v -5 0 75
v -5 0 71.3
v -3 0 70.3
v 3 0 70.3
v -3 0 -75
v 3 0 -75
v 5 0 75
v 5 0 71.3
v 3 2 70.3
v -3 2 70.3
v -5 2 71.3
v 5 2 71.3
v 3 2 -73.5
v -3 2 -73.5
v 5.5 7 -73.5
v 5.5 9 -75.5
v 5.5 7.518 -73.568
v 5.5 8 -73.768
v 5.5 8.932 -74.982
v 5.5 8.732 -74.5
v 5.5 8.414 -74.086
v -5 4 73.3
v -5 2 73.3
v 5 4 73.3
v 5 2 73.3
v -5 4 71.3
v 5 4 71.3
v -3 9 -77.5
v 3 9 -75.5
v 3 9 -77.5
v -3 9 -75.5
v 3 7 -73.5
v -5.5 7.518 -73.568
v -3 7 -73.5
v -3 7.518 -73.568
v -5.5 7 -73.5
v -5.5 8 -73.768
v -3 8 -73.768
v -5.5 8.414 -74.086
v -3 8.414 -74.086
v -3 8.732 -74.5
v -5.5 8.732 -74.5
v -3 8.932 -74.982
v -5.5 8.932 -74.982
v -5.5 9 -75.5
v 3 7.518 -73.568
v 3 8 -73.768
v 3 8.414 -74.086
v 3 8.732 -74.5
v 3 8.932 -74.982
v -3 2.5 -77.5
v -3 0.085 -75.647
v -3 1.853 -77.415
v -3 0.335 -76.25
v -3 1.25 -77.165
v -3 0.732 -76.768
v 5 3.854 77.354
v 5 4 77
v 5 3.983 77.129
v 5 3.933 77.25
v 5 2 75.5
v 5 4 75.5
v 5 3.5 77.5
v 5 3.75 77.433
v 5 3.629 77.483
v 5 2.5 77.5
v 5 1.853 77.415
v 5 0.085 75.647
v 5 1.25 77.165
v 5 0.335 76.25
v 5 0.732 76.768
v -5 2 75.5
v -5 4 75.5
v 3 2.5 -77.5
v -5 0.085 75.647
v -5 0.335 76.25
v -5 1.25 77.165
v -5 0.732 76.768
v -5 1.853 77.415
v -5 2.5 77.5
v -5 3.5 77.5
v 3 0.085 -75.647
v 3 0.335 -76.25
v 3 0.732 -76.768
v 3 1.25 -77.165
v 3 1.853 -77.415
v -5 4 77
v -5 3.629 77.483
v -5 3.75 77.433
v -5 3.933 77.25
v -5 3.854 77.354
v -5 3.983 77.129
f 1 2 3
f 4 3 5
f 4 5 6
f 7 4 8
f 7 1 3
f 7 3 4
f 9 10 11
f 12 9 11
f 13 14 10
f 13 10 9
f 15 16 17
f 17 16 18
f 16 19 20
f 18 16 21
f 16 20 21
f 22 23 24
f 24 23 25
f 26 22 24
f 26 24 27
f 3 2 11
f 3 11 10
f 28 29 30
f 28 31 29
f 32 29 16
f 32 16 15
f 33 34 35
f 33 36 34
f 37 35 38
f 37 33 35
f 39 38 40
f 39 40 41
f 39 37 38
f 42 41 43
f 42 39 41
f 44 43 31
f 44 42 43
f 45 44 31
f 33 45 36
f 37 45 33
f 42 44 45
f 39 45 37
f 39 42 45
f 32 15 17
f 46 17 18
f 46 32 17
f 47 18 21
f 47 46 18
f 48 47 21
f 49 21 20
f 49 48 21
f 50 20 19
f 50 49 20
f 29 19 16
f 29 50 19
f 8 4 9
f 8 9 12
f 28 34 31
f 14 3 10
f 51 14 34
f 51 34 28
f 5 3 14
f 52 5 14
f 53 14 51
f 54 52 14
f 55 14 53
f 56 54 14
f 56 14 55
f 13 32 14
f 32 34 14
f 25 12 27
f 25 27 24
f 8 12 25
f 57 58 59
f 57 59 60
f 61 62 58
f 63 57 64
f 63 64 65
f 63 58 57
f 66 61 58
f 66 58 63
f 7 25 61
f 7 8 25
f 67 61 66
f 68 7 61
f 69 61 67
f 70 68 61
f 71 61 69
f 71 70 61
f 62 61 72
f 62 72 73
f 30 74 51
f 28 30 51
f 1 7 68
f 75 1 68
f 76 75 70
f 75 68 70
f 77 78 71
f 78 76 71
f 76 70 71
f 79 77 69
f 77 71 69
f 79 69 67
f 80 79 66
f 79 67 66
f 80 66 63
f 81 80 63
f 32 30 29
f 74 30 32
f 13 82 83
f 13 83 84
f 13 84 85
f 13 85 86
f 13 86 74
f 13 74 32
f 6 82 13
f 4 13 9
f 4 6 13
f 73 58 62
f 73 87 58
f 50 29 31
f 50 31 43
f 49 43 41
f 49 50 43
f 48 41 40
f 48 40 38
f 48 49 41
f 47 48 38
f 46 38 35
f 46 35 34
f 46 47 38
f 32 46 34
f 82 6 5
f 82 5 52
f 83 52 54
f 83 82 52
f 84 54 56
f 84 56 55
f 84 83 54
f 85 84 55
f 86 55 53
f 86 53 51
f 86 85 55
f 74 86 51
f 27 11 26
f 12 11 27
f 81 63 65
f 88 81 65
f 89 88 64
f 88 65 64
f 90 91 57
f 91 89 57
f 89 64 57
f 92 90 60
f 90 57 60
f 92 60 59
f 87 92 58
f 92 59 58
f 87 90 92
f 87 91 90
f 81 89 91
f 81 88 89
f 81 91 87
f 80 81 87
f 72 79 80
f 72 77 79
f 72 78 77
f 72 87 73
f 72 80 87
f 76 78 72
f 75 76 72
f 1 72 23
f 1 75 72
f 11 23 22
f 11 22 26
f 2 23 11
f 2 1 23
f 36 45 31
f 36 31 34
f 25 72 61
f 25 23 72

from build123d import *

# Parameters (mm, degrees)
SKETCH1_W                       = 39
SKETCH1_H                       = 155
BOSS_EXTRUDE1_DEPTH             = 2
BOSS_EXTRUDE2_DEPTH             = 38
SKETCH3_W                       = 2
SKETCH3_H                       = 2
BOSS_EXTRUDE3_DEPTH             = 38
SKETCH4_W                       = 2
SKETCH4_H                       = 2
BOSS_EXTRUDE4_DEPTH             = 151
SKETCH6_W                       = 35
SKETCH6_H                       = 2.2
CUT_EXTRUDE1_DEPTH              = 160.340045186
SKETCH7_W                       = 35
SKETCH7_H                       = 2.2
CUT_EXTRUDE2_DEPTH              = 89.490112442
SKETCH5_W                       = 31
SKETCH5_H                       = 2
BOSS_EXTRUDE5_DEPTH             = 2
BOSS_EXTRUDE6_REACH             = 91.367
SKETCH8_W                       = 2
SKETCH8_H                       = 2
BOSS_EXTRUDE6_DIRECTION_2_REACH = 91.367
SKETCH10_W                      = 2
SKETCH10_H                      = 2.2
SKETCH10_W_2                    = 2.2
SKETCH10_H_2                    = 2
BOSS_EXTRUDE8_DEPTH             = 2
SKETCH11_W                      = 2
SKETCH11_H                      = 2.2
SKETCH11_W_2                    = 2.2
SKETCH11_H_2                    = 2
BOSS_EXTRUDE9_DEPTH             = 2
FILLET2_R                       = 2.5
SKETCH14_W                      = 36.5
SKETCH14_H                      = 7.75
BOSS_EXTRUDE10_DEPTH            = 2
SKETCH13_W                      = 31
SKETCH13_H                      = 3
CUT_EXTRUDE4_DEPTH              = 2
FILLET3_R                       = 2
FILLET4_R                       = 0.5
SKETCH15_R                      = 5.1
CUT_EXTRUDE5_DEPTH              = 90.367219941
SKETCH16_R                      = 7.1
BOSS_EXTRUDE11_DEPTH            = 1
FILLET5_R                       = 0.5
CUT_EXTRUDE3_DEPTH              = 160.340045186
FILLET6_R                       = 0.4
FILLET7_R                       = 0.5
CUT_EXTRUDE8_DEPTH              = 90.367220028
CUT_EXTRUDE8_DEPTH_BACK         = 90.367220028
CUT_EXTRUDE11_DEPTH             = 81.420768473
CUT_EXTRUDE12_DEPTH             = 80.851424566
CUT_EXTRUDE13_DEPTH             = 2.5
SKETCH27_R                      = 5.1
BOSS_EXTRUDE12_DEPTH            = 2
CUT_EXTRUDE14_DEPTH             = 80.851424533
CUT_EXTRUDE14_DEPTH_BACK        = 80.851424533
SKETCH29_W                      = 92.7
SKETCH29_H                      = 1
SKETCH30_W                      = 2.5
SKETCH30_H                      = 155
CUT_EXTRUDE15_DEPTH             = 80.851424533
BOSS_EXTRUDE13_START            = -14.5
SKETCH31_W                      = 2
SKETCH31_H                      = 5.25
BOSS_EXTRUDE13_DEPTH            = 29
CUT_EXTRUDE16_DEPTH             = 80.35678925
BOSS_EXTRUDE14_DEPTH            = 5.5
BOSS_EXTRUDE14_DEPTH_BACK       = 5.5


with BuildPart() as part:
    # Sketch1 → Boss-Extrude1 (new body)
    with BuildSketch(Plane(origin=(0, 0, 0), x_dir=(1, 0, 0), z_dir=(0, 1, 0))):
        Rectangle(SKETCH1_W, SKETCH1_H)
    extrude(amount=BOSS_EXTRUDE1_DEPTH)

    # Sketch2 → Boss-Extrude2 (add)
    with BuildSketch(Plane(origin=(0, 2, 0), x_dir=(1, 0, 0), z_dir=(0, 1, 0))):
        Polygon((-17.5, -77.5), (-17.5, -75.5), (-17.5, 75.5), (17.5, 75.5), (17.5, -75.5), (17.5, -77.5), (19.5, -77.5), (19.5, 77.5), (-19.5, 77.5), (-19.5, -77.5), align=None)
    extrude(amount=BOSS_EXTRUDE2_DEPTH)

    # Sketch3 → Boss-Extrude3 (add)
    with BuildSketch(Plane(origin=(0, 2, 0), x_dir=(1, 0, 0), z_dir=(0, 1, 0))):
        with Locations((-16.5, -76.5)):
            Rectangle(SKETCH3_W, SKETCH3_H)
        with Locations((-16.5, -72.3)):
            Rectangle(SKETCH3_W, SKETCH3_H)
        with Locations((16.5, -76.5)):
            Rectangle(SKETCH3_W, SKETCH3_H)
        with Locations((16.5, -72.3)):
            Rectangle(SKETCH3_W, SKETCH3_H)
    extrude(amount=BOSS_EXTRUDE3_DEPTH)

    # Sketch4 → Boss-Extrude4 (add)
    with BuildSketch(Plane.XY.offset(-75.5)):
        with Locations((-16.5, 39)):
            Rectangle(SKETCH4_W, SKETCH4_H)
        Polygon((-15.5, 33.8), (-17.5, 31.8), (-17.5, 35.8), (-15.5, 35.8), align=None)
        Polygon((15.5, 35.8), (17.5, 35.8), (17.5, 31.8), (15.5, 33.8), align=None)
        with Locations((16.5, 39)):
            Rectangle(SKETCH4_W, SKETCH4_H)
    extrude(amount=BOSS_EXTRUDE4_DEPTH)

    # Sketch6 → Cut-Extrude1 (cut, through all)
    with BuildSketch(Plane.XY.offset(-75.5)):
        with Locations((0, 36.9)):
            Rectangle(SKETCH6_W, SKETCH6_H)
    extrude(amount=CUT_EXTRUDE1_DEPTH, mode=Mode.SUBTRACT)

    # Sketch7 → Cut-Extrude2 (cut, through all)
    with BuildSketch(Plane(origin=(0, 2, 0), x_dir=(1, 0, 0), z_dir=(0, 1, 0))):
        with Locations((0, -74.4)):
            Rectangle(SKETCH7_W, SKETCH7_H)
    extrude(amount=CUT_EXTRUDE2_DEPTH, mode=Mode.SUBTRACT)

    # Sketch5 → Boss-Extrude5 (add)
    with BuildSketch(Plane(origin=(0, 2, 0), x_dir=(1, 0, 0), z_dir=(0, 1, 0))):
        with Locations((0, -76.5)):
            Rectangle(SKETCH5_W, SKETCH5_H)
        with Locations((0, -72.3)):
            Rectangle(SKETCH5_W, SKETCH5_H)
    extrude(amount=BOSS_EXTRUDE5_DEPTH)

    # Boss-Extrude6: up to this face of the body (flat: up to its plane)
    boss_extrude6_end = Plane(part.part.faces().sort_by_distance((17.5, 16.9, -2.1))[0])
    # Sketch8 → Boss-Extrude6 (add, up to the picked face)
    with BuildSketch(Plane(origin=(0, 0, 0), x_dir=(0, 0, -1), z_dir=(1, 0, 0)), mode=Mode.PRIVATE) as boss_extrude6_sk1:
        with Locations((74.5, 39)):
            Rectangle(SKETCH8_W, SKETCH8_H)
    boss_extrude6_tool1 = split(extrude(boss_extrude6_sk1.sketch, amount=BOSS_EXTRUDE6_REACH, mode=Mode.PRIVATE), bisect_by=boss_extrude6_end, keep=Keep.BOTH, mode=Mode.PRIVATE)
    # Sketch8 → Boss-Extrude6 (add, up to the picked face)
    with BuildSketch(Plane(origin=(0, 0, 0), x_dir=(0, 0, -1), z_dir=(1, 0, 0)), mode=Mode.PRIVATE) as boss_extrude6_sk2:
        Polygon((75.5, 35.8), (73.5, 35.8), (73.5, 33.8), (75.5, 31.8), align=None)
    boss_extrude6_tool2 = split(extrude(boss_extrude6_sk2.sketch, amount=BOSS_EXTRUDE6_REACH, mode=Mode.PRIVATE), bisect_by=boss_extrude6_end, keep=Keep.BOTH, mode=Mode.PRIVATE)
    add(boss_extrude6_tool1.solids().sort_by(Axis((0, 39, -74.5), (1, 0, 0)))[0])
    add(boss_extrude6_tool2.solids().sort_by(Axis((0, 34.244444, -74.611111), (1, 0, 0)))[0])

    # Boss-Extrude6 direction 2: up to this face of the body (flat: up to its plane)
    boss_extrude6_direction_2_end = Plane(part.part.faces().sort_by_distance((-17.5, 16.9, -2.1))[0])
    # Sketch8 → Boss-Extrude6 direction 2 (add, up to the picked face)
    with BuildSketch(Plane(origin=(0, 0, 0), x_dir=(0, 0, -1), z_dir=(1, 0, 0)), mode=Mode.PRIVATE) as boss_extrude6_direction_2_sk1:
        with Locations((74.5, 39)):
            Rectangle(SKETCH8_W, SKETCH8_H)
    boss_extrude6_direction_2_tool1 = split(extrude(boss_extrude6_direction_2_sk1.sketch, amount=-BOSS_EXTRUDE6_DIRECTION_2_REACH, mode=Mode.PRIVATE), bisect_by=boss_extrude6_direction_2_end, keep=Keep.BOTH, mode=Mode.PRIVATE)
    # Sketch8 → Boss-Extrude6 direction 2 (add, up to the picked face)
    with BuildSketch(Plane(origin=(0, 0, 0), x_dir=(0, 0, -1), z_dir=(1, 0, 0)), mode=Mode.PRIVATE) as boss_extrude6_direction_2_sk2:
        Polygon((75.5, 35.8), (73.5, 35.8), (73.5, 33.8), (75.5, 31.8), align=None)
    boss_extrude6_direction_2_tool2 = split(extrude(boss_extrude6_direction_2_sk2.sketch, amount=-BOSS_EXTRUDE6_DIRECTION_2_REACH, mode=Mode.PRIVATE), bisect_by=boss_extrude6_direction_2_end, keep=Keep.BOTH, mode=Mode.PRIVATE)
    add(boss_extrude6_direction_2_tool1.solids().sort_by(Axis((0, 39, -74.5), (-1, 0, 0)))[0])
    add(boss_extrude6_direction_2_tool2.solids().sort_by(Axis((0, 34.244444, -74.611111), (-1, 0, 0)))[0])

    # Sketch10 → Boss-Extrude8 (add)
    with BuildSketch(Plane(origin=(-17.5, 0, 0), x_dir=(0, 0, -1), z_dir=(1, 0, 0))):
        with Locations((-76.5, 36.9)):
            Rectangle(SKETCH10_W, SKETCH10_H)
        with Locations((-74.4, 39)):
            Rectangle(SKETCH10_W_2, SKETCH10_H_2)
    extrude(amount=BOSS_EXTRUDE8_DEPTH)

    # Sketch11 → Boss-Extrude9 (add)
    with BuildSketch(Plane.ZY.offset(-17.5)):
        with Locations((76.5, 36.9)):
            Rectangle(SKETCH11_W, SKETCH11_H)
        with Locations((74.4, 39)):
            Rectangle(SKETCH11_W_2, SKETCH11_H_2)
    extrude(amount=BOSS_EXTRUDE9_DEPTH)

    # Fillet2
    fillet2_edges = [part.edges().sort_by_distance(p)[0] for p in [
        (-17.5, 16.9, 71.3),
        (17.5, 16.9, 71.3),
        (19.5, 20, 77.5),
        (-19.5, 20, 77.5),
        (-19.5, 20, -77.5),
        (-17.5, 16.9, -75.5),
        (17.5, 16.9, -75.5),
        (19.5, 20, -77.5),
        (19.5, 40, 0),
        (-19.5, 40, 0),
        (19.5, 0, 0),
        (-19.5, 0, 0),
        (0, 40, -77.5),
        (0, 0, 77.5),
        (0, 0, -77.5),
        (-17.5, 40, 77.5),
        (17.5, 40, 77.5),
    ]]
    fillet(fillet2_edges, radius=FILLET2_R)

    # Sketch14 → Boss-Extrude10 (add)
    with BuildSketch(Plane.XY.offset(-75.5)):
        with Locations((0, 5.125)):
            Rectangle(SKETCH14_W, SKETCH14_H)
    extrude(amount=BOSS_EXTRUDE10_DEPTH)

    # Sketch13 → Cut-Extrude4 (cut)
    with BuildSketch(Plane(origin=(0, 0, -77.5), x_dir=(-1, 0, 0), z_dir=(0, 0, -1))):
        with Locations((0, 5.5)):
            Rectangle(SKETCH13_W, SKETCH13_H)
    extrude(amount=-CUT_EXTRUDE4_DEPTH, mode=Mode.SUBTRACT)

    # Fillet3
    fillet3_edges = [part.edges().sort_by_distance(p)[0] for p in [
        (0, 9, -73.5),
    ]]
    fillet(fillet3_edges, radius=FILLET3_R - 0.0001)  # a hair under: the kernel refuses the full size

    # Fillet4
    fillet4_edges = [part.edges().sort_by_distance(p)[0] for p in [
        (15.5, 5.5, -75.5),
        (15.5, 4, -76.5),
        (0, 7, -75.5),
        (15.5, 7, -76.5),
        (-15.5, 5.5, -75.5),
        (-15.5, 7, -76.5),
        (0, 4, -75.5),
        (-15.5, 4, -76.5),
        (15.5, 5.5, -77.5),
        (0, 4, -77.5),
        (-15.5, 5.5, -77.5),
        (0, 7, -77.5),
    ]]
    fillet(fillet4_edges, radius=FILLET4_R)

    # Sketch15 → Cut-Extrude5 (cut, through all)
    with BuildSketch(Plane.XZ):
        with Locations(Location((0, 38.75, 0), (0, 0, 270))):
            Circle(SKETCH15_R)
        with Locations(Location((0, -38.75, 0), (0, 0, 270))):
            Circle(SKETCH15_R)
    extrude(amount=-CUT_EXTRUDE5_DEPTH, mode=Mode.SUBTRACT)

    # Sketch16 → Boss-Extrude11 (add)
    with BuildSketch(Plane(origin=(0, 2, 0), x_dir=(1, 0, 0), z_dir=(0, 1, 0))):
        with Locations(Location((0, 38.75, 0), (0, 0, 270))):
            Circle(SKETCH16_R)
        with Locations(Location((0, -38.75, 0), (0, 0, 270))):
            Circle(SKETCH16_R)
    extrude(amount=BOSS_EXTRUDE11_DEPTH)

    # Fillet5
    fillet5_edges = [part.edges().sort_by_distance(p)[0] for p in [
        (0, 2, -45.85),
        (0, 3, -45.85),
        (0, 2, 31.65),
        (0, 3, 31.65),
    ]]
    fillet(fillet5_edges, radius=FILLET5_R - 0.0001)  # a hair under: the kernel refuses the full size

    # Sketch12 → Cut-Extrude3 (cut, through all)
    with BuildSketch(Plane.XY.offset(-75.5)):
        with BuildLine():
            Line((1.668907005, 12.688040659), (2.22520934, 10.250720878))
            ThreePointArc((2.22520934, 10.250720878), (4.338837391, 10.990311321), (6.234898019, 12.181685175))
            Line((6.234898019, 12.181685175), (4.676173514, 14.136263881))
            ThreePointArc((4.676173514, 14.136263881), (3.254128043, 13.242733491), (1.668907005, 12.688040659))
        make_face()
        with BuildLine():
            ThreePointArc((-6.234898019, 12.181685175), (-4.338837391, 10.990311321), (-2.22520934, 10.250720878))
            Line((-2.22520934, 10.250720878), (-1.668907005, 12.688040659))
            ThreePointArc((-1.668907005, 12.688040659), (-3.254128043, 13.242733491), (-4.676173514, 14.136263881))
            Line((-4.676173514, 14.136263881), (-6.234898019, 12.181685175))
        make_face()
        with BuildLine():
            ThreePointArc((-10, 20), (-9.749279122, 17.77479066), (-9.009688679, 15.661162609))
            Line((-9.009688679, 15.661162609), (-6.757266509, 16.745871957))
            ThreePointArc((-6.757266509, 16.745871957), (-7.311959341, 18.331092995), (-7.5, 20))
            Line((-7.5, 20), (-10, 20))
        make_face()
        with BuildLine():
            ThreePointArc((-6.234898019, 27.818314825), (-7.818314825, 26.234898019), (-9.009688679, 24.338837391))
            Line((-9.009688679, 24.338837391), (-6.757266509, 23.254128043))
            ThreePointArc((-6.757266509, 23.254128043), (-5.863736119, 24.676173514), (-4.676173514, 25.863736119))
            Line((-4.676173514, 25.863736119), (-6.234898019, 27.818314825))
        make_face()
        with BuildLine():
            ThreePointArc((-1.668907005, 27.311959341), (-0.839733571, 27.452841574), (0, 27.5))
            Line((0, 27.5), (0, 30))
            ThreePointArc((0, 30), (-1.119644761, 29.937122099), (-2.22520934, 29.749279122))
            Line((-2.22520934, 29.749279122), (-1.668907005, 27.311959341))
        make_face()
        with BuildLine():
            Line((0, 30), (0, 27.5))
            ThreePointArc((0, 27.5), (0.839733571, 27.452841574), (1.668907005, 27.311959341))
            Line((1.668907005, 27.311959341), (2.22520934, 29.749279122))
            ThreePointArc((2.22520934, 29.749279122), (1.119644761, 29.937122099), (0, 30))
        make_face()
        with BuildLine():
            Line((6.757266509, 23.254128043), (9.009688679, 24.338837391))
            ThreePointArc((9.009688679, 24.338837391), (7.818314825, 26.234898019), (6.234898019, 27.818314825))
            Line((6.234898019, 27.818314825), (4.676173514, 25.863736119))
            ThreePointArc((4.676173514, 25.863736119), (5.863736119, 24.676173514), (6.757266509, 23.254128043))
        make_face()
        with BuildLine():
            Line((6.757266509, 16.745871957), (9.009688679, 15.661162609))
            ThreePointArc((9.009688679, 15.661162609), (9.749279122, 17.77479066), (10, 20))
            Line((10, 20), (7.5, 20))
            ThreePointArc((7.5, 20), (7.311959341, 18.331092995), (6.757266509, 16.745871957))
        make_face()
        with BuildLine():
            ThreePointArc((2.5, 20), (2.43731978, 19.443697665), (2.25242217, 18.915290652))
            Line((2.25242217, 18.915290652), (4.50484434, 17.830581304))
            ThreePointArc((4.50484434, 17.830581304), (4.874639561, 18.88739533), (5, 20))
            Line((5, 20), (2.5, 20))
        make_face()
        with BuildLine():
            ThreePointArc((1.558724505, 21.954578706), (1.954578706, 21.558724505), (2.25242217, 21.084709348))
            Line((2.25242217, 21.084709348), (4.50484434, 22.169418696))
            ThreePointArc((4.50484434, 22.169418696), (3.909157412, 23.117449009), (3.117449009, 23.909157412))
            Line((3.117449009, 23.909157412), (1.558724505, 21.954578706))
        make_face()
        with BuildLine():
            Line((0, 25), (0, 22.5))
            ThreePointArc((0, 22.5), (0.27991119, 22.484280525), (0.556302335, 22.43731978))
            Line((0.556302335, 22.43731978), (1.11260467, 24.874639561))
            ThreePointArc((1.11260467, 24.874639561), (0.559822381, 24.968561049), (0, 25))
        make_face()
        with BuildLine():
            ThreePointArc((-0.556302335, 22.43731978), (-0.27991119, 22.484280525), (0, 22.5))
            Line((0, 22.5), (0, 25))
            ThreePointArc((0, 25), (-0.559822381, 24.968561049), (-1.11260467, 24.874639561))
            Line((-1.11260467, 24.874639561), (-0.556302335, 22.43731978))
        make_face()
        with BuildLine():
            ThreePointArc((-2.25242217, 21.084709348), (-1.954578706, 21.558724505), (-1.558724505, 21.954578706))
            Line((-1.558724505, 21.954578706), (-3.117449009, 23.909157412))
            ThreePointArc((-3.117449009, 23.909157412), (-3.909157412, 23.117449009), (-4.50484434, 22.169418696))
            Line((-4.50484434, 22.169418696), (-2.25242217, 21.084709348))
        make_face()
        with BuildLine():
            ThreePointArc((-2.25242217, 18.915290652), (-2.43731978, 19.443697665), (-2.5, 20))
            Line((-2.5, 20), (-5, 20))
            ThreePointArc((-5, 20), (-4.874639561, 18.88739533), (-4.50484434, 17.830581304))
            Line((-4.50484434, 17.830581304), (-2.25242217, 18.915290652))
        make_face()
        with BuildLine():
            ThreePointArc((-3.117449009, 16.090842588), (-2.169418696, 15.49515566), (-1.11260467, 15.125360439))
            Line((-1.11260467, 15.125360439), (-0.556302335, 17.56268022))
            ThreePointArc((-0.556302335, 17.56268022), (-1.084709348, 17.74757783), (-1.558724505, 18.045421294))
            Line((-1.558724505, 18.045421294), (-3.117449009, 16.090842588))
        make_face()
        with BuildLine():
            Line((0.556302335, 17.56268022), (1.11260467, 15.125360439))
            ThreePointArc((1.11260467, 15.125360439), (2.169418696, 15.49515566), (3.117449009, 16.090842588))
            Line((3.117449009, 16.090842588), (1.558724505, 18.045421294))
            ThreePointArc((1.558724505, 18.045421294), (1.084709348, 17.74757783), (0.556302335, 17.56268022))
        make_face()
    extrude(amount=-CUT_EXTRUDE3_DEPTH, mode=Mode.SUBTRACT)

    # Fillet6
    fillet6_edges = [part.edges().sort_by_distance(p)[0] for p in [
        (5.863736119, 24.676173514, -75.5),
        (5.455535766, 26.841025472, -75.5),
        (7.818314825, 26.234898019, -77.5),
        (7.883477594, 23.796482717, -77.5),
        (5.863736119, 24.676173514, -77.5),
        (5.455535766, 26.841025472, -77.5),
        (7.883477594, 23.796482717, -75.5),
        (7.818314825, 26.234898019, -75.5),
        (7.311959341, 18.331092995, -75.5),
        (8.75, 20, -75.5),
        (9.749279122, 17.77479066, -77.5),
        (7.883477594, 16.203517283, -77.5),
        (7.311959341, 18.331092995, -77.5),
        (8.75, 20, -77.5),
        (7.883477594, 16.203517283, -75.5),
        (9.749279122, 17.77479066, -75.5),
        (2.43731978, 19.443697665, -75.5),
        (3.75, 20, -75.5),
        (4.874639561, 18.88739533, -77.5),
        (3.378633255, 18.372935978, -77.5),
        (2.43731978, 19.443697665, -77.5),
        (3.75, 20, -77.5),
        (3.378633255, 18.372935978, -75.5),
        (4.874639561, 18.88739533, -75.5),
        (1.954578706, 21.558724505, -75.5),
        (2.338086757, 22.931868059, -75.5),
        (3.909157412, 23.117449009, -77.5),
        (3.378633255, 21.627064022, -77.5),
        (1.954578706, 21.558724505, -77.5),
        (2.338086757, 22.931868059, -77.5),
        (3.378633255, 21.627064022, -75.5),
        (3.909157412, 23.117449009, -75.5),
        (0, 27.5, -75.5),
        (-1.947058172, 28.530619232, -75.5),
        (0, 30, -77.5),
        (1.947058172, 28.530619232, -77.5),
        (0, 27.5, -77.5),
        (-1.947058172, 28.530619232, -77.5),
        (1.947058172, 28.530619232, -75.5),
        (0, 30, -75.5),
        (-5.863736119, 24.676173514, -75.5),
        (-7.883477594, 23.796482717, -75.5),
        (-7.818314825, 26.234898019, -77.5),
        (-5.455535766, 26.841025472, -77.5),
        (-5.863736119, 24.676173514, -77.5),
        (-7.883477594, 23.796482717, -77.5),
        (-5.455535766, 26.841025472, -75.5),
        (-7.818314825, 26.234898019, -75.5),
        (-7.311959341, 18.331092995, -75.5),
        (-7.883477594, 16.203517283, -75.5),
        (-9.749279122, 17.77479066, -77.5),
        (-8.75, 20, -77.5),
        (-7.311959341, 18.331092995, -77.5),
        (-7.883477594, 16.203517283, -77.5),
        (-8.75, 20, -75.5),
        (-9.749279122, 17.77479066, -75.5),
        (-3.254128043, 13.242733491, -75.5),
        (-1.947058172, 11.469380768, -75.5),
        (-4.338837391, 10.990311321, -77.5),
        (-5.455535766, 13.158974528, -77.5),
        (-3.254128043, 13.242733491, -77.5),
        (-1.947058172, 11.469380768, -77.5),
        (-5.455535766, 13.158974528, -75.5),
        (-4.338837391, 10.990311321, -75.5),
        (1.084709348, 17.74757783, -75.5),
        (2.338086757, 17.068131941, -75.5),
        (2.169418696, 15.49515566, -77.5),
        (0.834453502, 16.344020329, -77.5),
        (1.084709348, 17.74757783, -77.5),
        (2.338086757, 17.068131941, -77.5),
        (0.834453502, 16.344020329, -75.5),
        (2.169418696, 15.49515566, -75.5),
        (-2.43731978, 19.443697665, -75.5),
        (-3.378633255, 18.372935978, -75.5),
        (-4.874639561, 18.88739533, -77.5),
        (-3.75, 20, -77.5),
        (-2.43731978, 19.443697665, -77.5),
        (-3.378633255, 18.372935978, -77.5),
        (-3.75, 20, -75.5),
        (-4.874639561, 18.88739533, -75.5),
        (-1.084709348, 17.74757783, -75.5),
        (-0.834453502, 16.344020329, -75.5),
        (-2.169418696, 15.49515566, -77.5),
        (-2.338086757, 17.068131941, -77.5),
        (-1.084709348, 17.74757783, -77.5),
        (-0.834453502, 16.344020329, -77.5),
        (-2.338086757, 17.068131941, -75.5),
        (-2.169418696, 15.49515566, -75.5),
        (-1.954578706, 21.558724505, -75.5),
        (-3.378633255, 21.627064022, -75.5),
        (-3.909157412, 23.117449009, -77.5),
        (-2.338086757, 22.931868059, -77.5),
        (-1.954578706, 21.558724505, -77.5),
        (-3.378633255, 21.627064022, -77.5),
        (-2.338086757, 22.931868059, -75.5),
        (-3.909157412, 23.117449009, -75.5),
        (0, 25, -77.5),
        (0.834453502, 23.655979671, -77.5),
        (0, 22.5, -75.5),
        (-0.834453502, 23.655979671, -75.5),
        (0, 22.5, -77.5),
        (-0.834453502, 23.655979671, -77.5),
        (0, 25, -75.5),
        (0.834453502, 23.655979671, -75.5),
        (3.254128043, 13.242733491, -75.5),
        (5.455535766, 13.158974528, -75.5),
        (4.338837391, 10.990311321, -77.5),
        (1.947058172, 11.469380768, -77.5),
        (3.254128043, 13.242733491, -77.5),
        (5.455535766, 13.158974528, -77.5),
        (1.947058172, 11.469380768, -75.5),
        (4.338837391, 10.990311321, -75.5),
    ]]
    fillet(fillet6_edges, radius=FILLET6_R)

    # Fillet7
    fillet7_edges = [part.edges().sort_by_distance(p)[0] for p in [
        (15.5, 40, 0.75),
        (0, 4, 77.5),
        (0, 40, -73.5),
        (-15.5, 40, 0.75),
        (-15.5, 20.75, 77.5),
        (-15.5, 39.267766953, 76.767766953),
        (15.5, 20.75, 77.5),
        (15.5, 39.267766953, 76.767766953),
    ]]
    fillet(fillet7_edges, radius=FILLET7_R)

    # Sketch20 → Cut-Extrude8 (cut, two sides: drawn at the far end of the back side and taken through both)
    with BuildSketch(Plane(origin=(0, 0, 0), x_dir=(0, 0, -1), z_dir=(1, 0, 0)).offset(-CUT_EXTRUDE8_DEPTH_BACK)):
        Polygon((77.5, 40), (77.5, 9), (75.5, 9), (73.5, 9), (73.5, 4), (-75.5, 4), (-77.5, 4), (-77.5, 40), align=None)
    extrude(amount=CUT_EXTRUDE8_DEPTH + CUT_EXTRUDE8_DEPTH_BACK, mode=Mode.SUBTRACT)

    # Sketch21 → Cut-Extrude11 (cut, through all)
    with BuildSketch(Plane(origin=(0, 0, 0), x_dir=(1, 0, 0), z_dir=(0, 1, 0))):
        Polygon((17, 77.5), (17, 73.5), (17, -77.5), (19.5, -77.5), (19.5, 77.5), align=None)
        Polygon((-17, 77.5), (-17, 73.5), (-17, -77.5), (-19.5, -77.5), (-19.5, 77.5), align=None)
    extrude(amount=CUT_EXTRUDE11_DEPTH, mode=Mode.SUBTRACT)

    # Sketch24 → Cut-Extrude12 (cut, through all)
    with BuildSketch(Plane(origin=(0, 0, 0), x_dir=(1, 0, 0), z_dir=(0, 1, 0))):
        Polygon((17, -77.5), (15, -77.5), (15, -71.3), (17, -70.3), align=None)
        Polygon((-17, -70.3), (-17, -77.5), (-15, -77.5), (-15, -71.3), align=None)
    extrude(amount=CUT_EXTRUDE12_DEPTH, mode=Mode.SUBTRACT)

    # Sketch26 → Cut-Extrude13 (cut)
    with BuildSketch(Plane(origin=(17, 0, 0), x_dir=(0, 0, -1), z_dir=(1, 0, 0))):
        Polygon((75.5, 9), (73.5, 7), (73.5, 9), align=None)
    cut_extrude13 = extrude(amount=-CUT_EXTRUDE13_DEPTH, mode=Mode.SUBTRACT)

    # Mirror1: Cut-Extrude13 across plane
    add(cut_extrude13.mirror(Plane(origin=(0, 0, 0), x_dir=(0, 0, 1), z_dir=(1, 0, 0))), mode=Mode.SUBTRACT)

    # Sketch27 → Boss-Extrude12 (add)
    with BuildSketch(Plane.XZ):
        with Locations((0, 38.75)):
            Circle(SKETCH27_R)
        with Locations((0, -38.75)):
            Circle(SKETCH27_R)
    extrude(amount=-BOSS_EXTRUDE12_DEPTH)

    # Sketch29 → Cut-Extrude14 (cut, two sides: drawn at the far end of the back side and taken through both)
    with BuildSketch(Plane(origin=(0, 0, 0), x_dir=(0, 0, -1), z_dir=(1, 0, 0)).offset(-CUT_EXTRUDE14_DEPTH_BACK)):
        with Locations((0, 2.5)):
            Rectangle(SKETCH29_W, SKETCH29_H)
    extrude(amount=CUT_EXTRUDE14_DEPTH + CUT_EXTRUDE14_DEPTH_BACK, mode=Mode.SUBTRACT)

    # Sketch30 → Cut-Extrude15 (cut, through all)
    with BuildSketch(Plane(origin=(0, 0, 0), x_dir=(1, 0, 0), z_dir=(0, 1, 0))):
        with Locations((-15.75, 0)):
            Rectangle(SKETCH30_W, SKETCH30_H)
        with Locations((15.75, 0)):
            Rectangle(SKETCH30_W, SKETCH30_H)
    extrude(amount=CUT_EXTRUDE15_DEPTH, mode=Mode.SUBTRACT)

    # Sketch31 → Boss-Extrude13 (add)
    with BuildSketch(Plane(origin=(0, 0, 0), x_dir=(0, 0, -1), z_dir=(1, 0, 0)).offset(BOSS_EXTRUDE13_START)):
        with Locations((76.5, 5.625)):
            Rectangle(SKETCH31_W, SKETCH31_H)
    extrude(amount=BOSS_EXTRUDE13_DEPTH)

    # Sketch32 → Cut-Extrude16 (cut, through all)
    with BuildSketch(Plane(origin=(0, 0, 0), x_dir=(1, 0, 0), z_dir=(0, 1, 0))):
        Polygon((14.5, 77.5), (3, 77.5), (3, -70.3), (5, -71.3), (5, -77.5), (14.5, -77.5), align=None)
        Polygon((-3, -70.3), (-3, 77.5), (-14.5, 77.5), (-14.5, -77.5), (-5, -77.5), (-5, -71.3), align=None)
    extrude(amount=CUT_EXTRUDE16_DEPTH, mode=Mode.SUBTRACT)

    # Sketch33 → Boss-Extrude14 (add, two sides: drawn at the far end of the back side and taken through both)
    with BuildSketch(Plane(origin=(0, 0, 0), x_dir=(0, 0, -1), z_dir=(1, 0, 0)).offset(-BOSS_EXTRUDE14_DEPTH_BACK)):
        with BuildLine():
            Line((75.5, 9), (73.5, 7))
            ThreePointArc((73.5, 7), (74.085786438, 8.414213562), (75.5, 9))
        make_face()
    extrude(amount=BOSS_EXTRUDE14_DEPTH + BOSS_EXTRUDE14_DEPTH_BACK)


solid = part.part
